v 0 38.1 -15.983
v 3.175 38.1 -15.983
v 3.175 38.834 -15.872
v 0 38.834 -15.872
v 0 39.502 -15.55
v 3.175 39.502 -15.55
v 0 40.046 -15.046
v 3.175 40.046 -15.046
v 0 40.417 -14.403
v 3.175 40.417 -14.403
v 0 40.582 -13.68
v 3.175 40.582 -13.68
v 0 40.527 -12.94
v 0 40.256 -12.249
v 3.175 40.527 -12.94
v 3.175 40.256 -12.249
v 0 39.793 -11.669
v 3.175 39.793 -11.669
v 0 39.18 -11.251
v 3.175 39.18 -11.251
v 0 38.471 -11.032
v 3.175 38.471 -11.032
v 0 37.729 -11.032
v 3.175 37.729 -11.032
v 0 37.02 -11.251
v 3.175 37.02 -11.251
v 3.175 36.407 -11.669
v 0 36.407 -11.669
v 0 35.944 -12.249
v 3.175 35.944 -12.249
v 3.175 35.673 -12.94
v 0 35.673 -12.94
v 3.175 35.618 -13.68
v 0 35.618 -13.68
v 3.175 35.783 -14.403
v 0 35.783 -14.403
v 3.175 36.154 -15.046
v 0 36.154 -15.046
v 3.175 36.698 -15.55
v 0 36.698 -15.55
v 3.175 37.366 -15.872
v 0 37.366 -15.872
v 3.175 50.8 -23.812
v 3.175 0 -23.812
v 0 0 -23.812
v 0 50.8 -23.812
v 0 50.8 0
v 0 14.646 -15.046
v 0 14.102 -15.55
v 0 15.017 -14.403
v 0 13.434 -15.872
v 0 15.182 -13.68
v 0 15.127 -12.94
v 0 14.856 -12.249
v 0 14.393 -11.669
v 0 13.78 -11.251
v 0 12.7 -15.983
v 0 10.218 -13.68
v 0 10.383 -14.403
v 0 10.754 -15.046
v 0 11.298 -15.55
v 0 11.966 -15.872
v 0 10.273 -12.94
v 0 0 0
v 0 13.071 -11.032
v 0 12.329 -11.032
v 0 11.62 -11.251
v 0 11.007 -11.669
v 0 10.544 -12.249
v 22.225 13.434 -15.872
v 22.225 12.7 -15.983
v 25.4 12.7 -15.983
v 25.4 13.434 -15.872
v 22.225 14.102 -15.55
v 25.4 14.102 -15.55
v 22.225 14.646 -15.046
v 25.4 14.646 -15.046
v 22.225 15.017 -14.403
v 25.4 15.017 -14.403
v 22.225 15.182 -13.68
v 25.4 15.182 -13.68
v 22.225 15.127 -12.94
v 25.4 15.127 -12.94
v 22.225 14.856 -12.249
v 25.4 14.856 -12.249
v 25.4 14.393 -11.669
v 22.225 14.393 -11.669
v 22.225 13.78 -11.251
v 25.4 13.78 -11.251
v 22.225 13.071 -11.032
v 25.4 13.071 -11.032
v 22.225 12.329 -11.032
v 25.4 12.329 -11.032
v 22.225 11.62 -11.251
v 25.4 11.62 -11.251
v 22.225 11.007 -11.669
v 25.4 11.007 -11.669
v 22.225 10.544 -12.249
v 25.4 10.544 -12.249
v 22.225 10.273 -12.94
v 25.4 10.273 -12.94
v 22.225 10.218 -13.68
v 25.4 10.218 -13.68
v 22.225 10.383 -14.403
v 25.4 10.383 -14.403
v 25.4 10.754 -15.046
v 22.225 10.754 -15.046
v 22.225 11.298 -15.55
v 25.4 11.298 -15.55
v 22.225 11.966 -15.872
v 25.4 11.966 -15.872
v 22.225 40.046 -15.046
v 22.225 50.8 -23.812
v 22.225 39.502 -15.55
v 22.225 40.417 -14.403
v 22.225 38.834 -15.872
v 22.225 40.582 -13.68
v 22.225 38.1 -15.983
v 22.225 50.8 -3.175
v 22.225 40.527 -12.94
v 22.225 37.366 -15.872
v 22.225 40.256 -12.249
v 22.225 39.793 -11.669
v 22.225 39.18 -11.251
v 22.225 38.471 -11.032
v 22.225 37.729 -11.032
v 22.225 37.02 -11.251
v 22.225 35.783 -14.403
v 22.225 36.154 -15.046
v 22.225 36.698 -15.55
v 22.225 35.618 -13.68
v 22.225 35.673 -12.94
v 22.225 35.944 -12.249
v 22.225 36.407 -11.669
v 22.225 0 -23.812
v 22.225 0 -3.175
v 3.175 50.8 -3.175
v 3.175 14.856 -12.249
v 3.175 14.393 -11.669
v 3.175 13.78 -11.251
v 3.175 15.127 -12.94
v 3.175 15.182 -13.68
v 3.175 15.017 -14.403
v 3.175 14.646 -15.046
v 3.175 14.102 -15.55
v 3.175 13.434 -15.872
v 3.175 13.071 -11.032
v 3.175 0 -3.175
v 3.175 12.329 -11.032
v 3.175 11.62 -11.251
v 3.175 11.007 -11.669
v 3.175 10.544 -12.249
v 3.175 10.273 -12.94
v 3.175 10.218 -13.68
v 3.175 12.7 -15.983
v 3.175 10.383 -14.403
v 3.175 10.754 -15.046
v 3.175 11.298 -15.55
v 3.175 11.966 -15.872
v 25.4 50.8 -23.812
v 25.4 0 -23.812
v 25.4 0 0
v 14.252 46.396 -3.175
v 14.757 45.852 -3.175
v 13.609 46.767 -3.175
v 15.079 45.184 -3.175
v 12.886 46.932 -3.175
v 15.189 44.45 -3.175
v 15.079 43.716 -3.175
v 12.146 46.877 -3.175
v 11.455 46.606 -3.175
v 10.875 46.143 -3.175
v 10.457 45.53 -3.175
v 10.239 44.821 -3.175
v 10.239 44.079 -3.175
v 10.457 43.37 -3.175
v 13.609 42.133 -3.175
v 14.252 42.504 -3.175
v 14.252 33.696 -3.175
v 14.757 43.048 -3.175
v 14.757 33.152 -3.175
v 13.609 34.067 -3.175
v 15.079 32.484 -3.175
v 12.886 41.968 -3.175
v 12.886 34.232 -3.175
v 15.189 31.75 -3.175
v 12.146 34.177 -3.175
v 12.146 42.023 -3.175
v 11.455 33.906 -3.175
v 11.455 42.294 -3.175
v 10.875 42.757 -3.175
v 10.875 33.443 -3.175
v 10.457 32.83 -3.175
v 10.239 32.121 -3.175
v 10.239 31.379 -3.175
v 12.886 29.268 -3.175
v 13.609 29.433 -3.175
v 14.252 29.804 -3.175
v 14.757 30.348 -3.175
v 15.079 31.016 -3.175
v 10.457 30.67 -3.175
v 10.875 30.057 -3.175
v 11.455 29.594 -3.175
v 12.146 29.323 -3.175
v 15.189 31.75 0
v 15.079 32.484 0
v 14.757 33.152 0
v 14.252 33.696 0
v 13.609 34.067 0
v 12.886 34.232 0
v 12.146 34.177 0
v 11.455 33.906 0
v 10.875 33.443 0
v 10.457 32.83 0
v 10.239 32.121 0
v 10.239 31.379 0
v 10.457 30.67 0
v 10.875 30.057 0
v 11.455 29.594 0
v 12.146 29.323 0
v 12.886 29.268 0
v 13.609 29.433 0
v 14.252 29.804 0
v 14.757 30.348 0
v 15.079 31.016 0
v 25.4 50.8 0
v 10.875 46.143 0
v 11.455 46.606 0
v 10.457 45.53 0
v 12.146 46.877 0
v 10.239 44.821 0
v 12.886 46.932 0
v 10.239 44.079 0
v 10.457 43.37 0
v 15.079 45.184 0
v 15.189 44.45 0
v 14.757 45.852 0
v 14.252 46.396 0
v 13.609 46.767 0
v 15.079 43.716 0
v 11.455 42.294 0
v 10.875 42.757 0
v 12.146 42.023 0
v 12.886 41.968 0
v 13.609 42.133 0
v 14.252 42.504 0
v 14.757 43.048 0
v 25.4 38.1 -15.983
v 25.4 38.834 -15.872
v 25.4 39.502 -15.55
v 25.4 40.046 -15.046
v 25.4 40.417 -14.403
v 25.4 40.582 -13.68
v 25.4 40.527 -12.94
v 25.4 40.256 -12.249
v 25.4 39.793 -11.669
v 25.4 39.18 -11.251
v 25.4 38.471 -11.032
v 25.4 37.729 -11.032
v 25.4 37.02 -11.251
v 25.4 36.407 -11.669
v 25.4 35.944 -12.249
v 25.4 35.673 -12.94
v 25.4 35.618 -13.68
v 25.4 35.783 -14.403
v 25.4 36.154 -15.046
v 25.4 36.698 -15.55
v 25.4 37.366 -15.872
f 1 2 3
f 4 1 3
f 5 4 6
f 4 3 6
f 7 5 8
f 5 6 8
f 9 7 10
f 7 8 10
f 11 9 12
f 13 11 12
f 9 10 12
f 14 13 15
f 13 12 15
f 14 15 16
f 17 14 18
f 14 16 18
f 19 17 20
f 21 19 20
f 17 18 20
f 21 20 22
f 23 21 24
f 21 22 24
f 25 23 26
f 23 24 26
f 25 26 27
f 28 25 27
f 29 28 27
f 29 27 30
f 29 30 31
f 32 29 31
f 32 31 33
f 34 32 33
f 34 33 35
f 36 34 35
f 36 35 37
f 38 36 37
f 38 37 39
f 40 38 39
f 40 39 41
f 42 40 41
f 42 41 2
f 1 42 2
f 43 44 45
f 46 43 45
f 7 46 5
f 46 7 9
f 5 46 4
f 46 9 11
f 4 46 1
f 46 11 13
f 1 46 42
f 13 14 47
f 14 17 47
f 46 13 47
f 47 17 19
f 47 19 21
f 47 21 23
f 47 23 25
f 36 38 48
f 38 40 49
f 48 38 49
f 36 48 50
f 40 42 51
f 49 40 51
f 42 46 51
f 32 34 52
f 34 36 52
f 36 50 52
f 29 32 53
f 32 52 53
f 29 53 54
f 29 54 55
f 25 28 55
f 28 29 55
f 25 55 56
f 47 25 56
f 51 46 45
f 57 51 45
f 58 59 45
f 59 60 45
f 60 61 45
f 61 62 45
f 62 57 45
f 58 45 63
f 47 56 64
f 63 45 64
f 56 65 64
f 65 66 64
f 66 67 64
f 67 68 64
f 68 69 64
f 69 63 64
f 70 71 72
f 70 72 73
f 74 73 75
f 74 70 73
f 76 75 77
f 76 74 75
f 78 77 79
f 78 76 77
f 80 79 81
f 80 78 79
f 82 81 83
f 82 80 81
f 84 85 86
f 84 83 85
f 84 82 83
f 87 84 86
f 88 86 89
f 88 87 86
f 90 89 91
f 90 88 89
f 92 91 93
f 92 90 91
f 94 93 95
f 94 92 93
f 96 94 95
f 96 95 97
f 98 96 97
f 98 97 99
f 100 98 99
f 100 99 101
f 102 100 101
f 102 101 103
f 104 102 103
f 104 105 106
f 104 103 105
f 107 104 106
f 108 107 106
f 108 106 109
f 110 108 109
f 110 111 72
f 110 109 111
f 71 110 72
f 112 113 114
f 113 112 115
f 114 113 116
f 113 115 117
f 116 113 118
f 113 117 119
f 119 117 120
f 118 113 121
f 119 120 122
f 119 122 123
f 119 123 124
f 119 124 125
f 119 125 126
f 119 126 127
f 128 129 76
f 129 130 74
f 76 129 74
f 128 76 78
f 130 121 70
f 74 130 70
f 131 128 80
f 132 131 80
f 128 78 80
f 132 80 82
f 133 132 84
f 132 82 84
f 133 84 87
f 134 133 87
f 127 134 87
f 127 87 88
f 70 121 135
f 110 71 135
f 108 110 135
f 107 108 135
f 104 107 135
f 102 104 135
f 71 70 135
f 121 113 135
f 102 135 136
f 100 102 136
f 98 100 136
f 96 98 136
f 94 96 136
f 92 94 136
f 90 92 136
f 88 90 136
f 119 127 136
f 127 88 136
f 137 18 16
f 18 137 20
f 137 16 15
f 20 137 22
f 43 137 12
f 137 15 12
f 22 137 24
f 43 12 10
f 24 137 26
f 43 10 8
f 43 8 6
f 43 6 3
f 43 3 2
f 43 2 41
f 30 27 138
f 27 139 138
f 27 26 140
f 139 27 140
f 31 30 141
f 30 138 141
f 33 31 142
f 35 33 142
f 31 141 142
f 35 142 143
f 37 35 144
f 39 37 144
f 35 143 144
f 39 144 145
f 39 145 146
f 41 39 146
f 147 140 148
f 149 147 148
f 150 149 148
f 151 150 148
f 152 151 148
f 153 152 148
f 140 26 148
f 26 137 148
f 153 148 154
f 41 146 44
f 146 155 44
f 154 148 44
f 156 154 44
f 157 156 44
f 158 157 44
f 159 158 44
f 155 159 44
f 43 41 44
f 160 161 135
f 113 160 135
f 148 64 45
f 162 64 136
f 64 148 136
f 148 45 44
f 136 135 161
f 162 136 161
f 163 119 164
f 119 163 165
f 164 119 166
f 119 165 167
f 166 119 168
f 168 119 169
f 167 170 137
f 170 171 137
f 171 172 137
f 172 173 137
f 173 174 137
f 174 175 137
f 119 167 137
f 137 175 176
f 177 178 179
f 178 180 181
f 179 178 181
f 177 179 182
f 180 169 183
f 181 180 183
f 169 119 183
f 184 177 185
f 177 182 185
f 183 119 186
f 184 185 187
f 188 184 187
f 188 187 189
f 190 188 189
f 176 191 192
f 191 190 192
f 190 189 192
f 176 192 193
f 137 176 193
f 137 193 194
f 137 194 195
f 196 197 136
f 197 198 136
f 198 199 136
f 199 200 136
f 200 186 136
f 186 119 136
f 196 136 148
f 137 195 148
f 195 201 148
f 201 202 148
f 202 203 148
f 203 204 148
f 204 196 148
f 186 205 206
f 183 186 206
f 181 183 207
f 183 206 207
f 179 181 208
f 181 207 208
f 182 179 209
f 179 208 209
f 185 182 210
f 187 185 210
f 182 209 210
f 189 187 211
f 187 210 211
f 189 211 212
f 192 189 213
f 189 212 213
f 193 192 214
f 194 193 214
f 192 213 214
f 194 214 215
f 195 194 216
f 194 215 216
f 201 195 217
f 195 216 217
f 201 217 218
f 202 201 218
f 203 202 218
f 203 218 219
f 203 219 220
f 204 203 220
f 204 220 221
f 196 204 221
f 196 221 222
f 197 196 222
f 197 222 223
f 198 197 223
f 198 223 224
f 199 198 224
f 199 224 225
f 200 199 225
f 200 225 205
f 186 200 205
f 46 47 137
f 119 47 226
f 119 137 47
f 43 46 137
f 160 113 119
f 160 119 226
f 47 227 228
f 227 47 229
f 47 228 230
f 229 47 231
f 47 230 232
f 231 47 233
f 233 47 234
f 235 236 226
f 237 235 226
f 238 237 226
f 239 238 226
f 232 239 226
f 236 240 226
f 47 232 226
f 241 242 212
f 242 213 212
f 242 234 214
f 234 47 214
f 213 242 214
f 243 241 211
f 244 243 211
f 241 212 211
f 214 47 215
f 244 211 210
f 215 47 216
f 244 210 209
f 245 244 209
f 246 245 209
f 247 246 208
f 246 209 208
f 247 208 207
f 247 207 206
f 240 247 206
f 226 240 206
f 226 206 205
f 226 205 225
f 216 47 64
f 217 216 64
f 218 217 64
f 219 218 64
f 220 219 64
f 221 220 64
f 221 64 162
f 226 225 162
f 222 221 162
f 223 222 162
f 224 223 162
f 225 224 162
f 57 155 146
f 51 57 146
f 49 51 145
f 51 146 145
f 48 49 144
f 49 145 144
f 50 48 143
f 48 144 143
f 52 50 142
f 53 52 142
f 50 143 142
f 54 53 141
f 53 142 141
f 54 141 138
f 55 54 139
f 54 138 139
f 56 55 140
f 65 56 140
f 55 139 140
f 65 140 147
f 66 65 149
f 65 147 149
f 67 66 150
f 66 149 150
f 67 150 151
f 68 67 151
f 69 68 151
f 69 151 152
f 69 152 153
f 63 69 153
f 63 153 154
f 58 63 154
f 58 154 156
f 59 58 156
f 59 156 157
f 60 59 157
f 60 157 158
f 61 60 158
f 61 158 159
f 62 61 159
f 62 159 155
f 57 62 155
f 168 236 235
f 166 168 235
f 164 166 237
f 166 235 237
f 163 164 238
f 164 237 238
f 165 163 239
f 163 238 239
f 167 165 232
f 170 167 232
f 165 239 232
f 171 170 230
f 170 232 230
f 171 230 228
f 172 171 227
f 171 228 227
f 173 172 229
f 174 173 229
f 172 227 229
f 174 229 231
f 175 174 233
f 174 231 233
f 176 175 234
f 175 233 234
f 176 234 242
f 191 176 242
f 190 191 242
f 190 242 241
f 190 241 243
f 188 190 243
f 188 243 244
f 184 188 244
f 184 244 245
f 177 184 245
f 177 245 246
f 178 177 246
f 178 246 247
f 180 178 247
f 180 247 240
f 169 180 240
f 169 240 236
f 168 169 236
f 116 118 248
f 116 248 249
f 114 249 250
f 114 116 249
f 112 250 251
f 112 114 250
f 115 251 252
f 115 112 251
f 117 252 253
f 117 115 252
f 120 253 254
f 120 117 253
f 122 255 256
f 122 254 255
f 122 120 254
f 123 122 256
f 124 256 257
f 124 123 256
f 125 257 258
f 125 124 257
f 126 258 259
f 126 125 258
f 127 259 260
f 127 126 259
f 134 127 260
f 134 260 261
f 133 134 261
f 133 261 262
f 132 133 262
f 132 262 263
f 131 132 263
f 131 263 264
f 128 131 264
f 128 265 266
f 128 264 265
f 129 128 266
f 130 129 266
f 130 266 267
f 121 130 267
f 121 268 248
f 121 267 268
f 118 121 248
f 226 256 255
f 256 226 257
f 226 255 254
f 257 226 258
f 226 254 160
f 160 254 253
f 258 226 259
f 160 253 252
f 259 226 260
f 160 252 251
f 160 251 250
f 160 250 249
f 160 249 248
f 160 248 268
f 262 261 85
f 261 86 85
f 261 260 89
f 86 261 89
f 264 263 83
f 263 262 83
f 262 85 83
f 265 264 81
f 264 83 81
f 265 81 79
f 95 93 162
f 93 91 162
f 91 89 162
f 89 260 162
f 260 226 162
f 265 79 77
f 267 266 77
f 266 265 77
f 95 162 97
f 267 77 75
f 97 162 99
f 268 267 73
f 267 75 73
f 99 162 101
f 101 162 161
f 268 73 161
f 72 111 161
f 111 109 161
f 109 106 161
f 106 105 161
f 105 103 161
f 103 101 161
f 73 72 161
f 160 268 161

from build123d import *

# Parameters (mm, degrees)
BOSS_EXTRUDE1_DEPTH     = 50.8
SKETCH6_R               = 2.4892
CUT_EXTRUDE2_DEPTH      = 23.225
CUT_EXTRUDE2_DEPTH_BACK = 4.175
SKETCH5_R               = 2.4892
CUT_EXTRUDE1_DEPTH      = 24.8125


with BuildPart() as part:
    # Sketch1 → Boss-Extrude1 (new body)
    with BuildSketch(Plane(origin=(0, 0, 0), x_dir=(1, 0, 0), z_dir=(0, 1, 0))):
        Polygon((0, 0), (25.4, 0), (25.4, 23.8125), (22.225, 23.8125), (22.225, 3.175), (3.175, 3.175), (3.175, 23.8125), (0, 23.8125), align=None)
    extrude(amount=BOSS_EXTRUDE1_DEPTH)

    # Sketch6 → Cut-Extrude2 (cut, two sides)
    with BuildSketch(Plane(origin=(3.175, 0, 0), x_dir=(0, 0, -1), z_dir=(1, 0, 0))) as cut_extrude2_sk:
        with Locations((13.49375, 12.7)):
            Circle(SKETCH6_R)
        with Locations((13.49375, 38.1)):
            Circle(SKETCH6_R)
    extrude(amount=CUT_EXTRUDE2_DEPTH, mode=Mode.SUBTRACT)
    extrude(cut_extrude2_sk.sketch, amount=-CUT_EXTRUDE2_DEPTH_BACK, mode=Mode.SUBTRACT)

    # Sketch5 → Cut-Extrude1 (cut, through all)
    with BuildSketch(Plane.XY):
        with Locations((12.7, 44.45)):
            Circle(SKETCH5_R)
        with Locations((12.7, 31.75)):
            Circle(SKETCH5_R)
    extrude(amount=-CUT_EXTRUDE1_DEPTH, mode=Mode.SUBTRACT)


solid = part.part
